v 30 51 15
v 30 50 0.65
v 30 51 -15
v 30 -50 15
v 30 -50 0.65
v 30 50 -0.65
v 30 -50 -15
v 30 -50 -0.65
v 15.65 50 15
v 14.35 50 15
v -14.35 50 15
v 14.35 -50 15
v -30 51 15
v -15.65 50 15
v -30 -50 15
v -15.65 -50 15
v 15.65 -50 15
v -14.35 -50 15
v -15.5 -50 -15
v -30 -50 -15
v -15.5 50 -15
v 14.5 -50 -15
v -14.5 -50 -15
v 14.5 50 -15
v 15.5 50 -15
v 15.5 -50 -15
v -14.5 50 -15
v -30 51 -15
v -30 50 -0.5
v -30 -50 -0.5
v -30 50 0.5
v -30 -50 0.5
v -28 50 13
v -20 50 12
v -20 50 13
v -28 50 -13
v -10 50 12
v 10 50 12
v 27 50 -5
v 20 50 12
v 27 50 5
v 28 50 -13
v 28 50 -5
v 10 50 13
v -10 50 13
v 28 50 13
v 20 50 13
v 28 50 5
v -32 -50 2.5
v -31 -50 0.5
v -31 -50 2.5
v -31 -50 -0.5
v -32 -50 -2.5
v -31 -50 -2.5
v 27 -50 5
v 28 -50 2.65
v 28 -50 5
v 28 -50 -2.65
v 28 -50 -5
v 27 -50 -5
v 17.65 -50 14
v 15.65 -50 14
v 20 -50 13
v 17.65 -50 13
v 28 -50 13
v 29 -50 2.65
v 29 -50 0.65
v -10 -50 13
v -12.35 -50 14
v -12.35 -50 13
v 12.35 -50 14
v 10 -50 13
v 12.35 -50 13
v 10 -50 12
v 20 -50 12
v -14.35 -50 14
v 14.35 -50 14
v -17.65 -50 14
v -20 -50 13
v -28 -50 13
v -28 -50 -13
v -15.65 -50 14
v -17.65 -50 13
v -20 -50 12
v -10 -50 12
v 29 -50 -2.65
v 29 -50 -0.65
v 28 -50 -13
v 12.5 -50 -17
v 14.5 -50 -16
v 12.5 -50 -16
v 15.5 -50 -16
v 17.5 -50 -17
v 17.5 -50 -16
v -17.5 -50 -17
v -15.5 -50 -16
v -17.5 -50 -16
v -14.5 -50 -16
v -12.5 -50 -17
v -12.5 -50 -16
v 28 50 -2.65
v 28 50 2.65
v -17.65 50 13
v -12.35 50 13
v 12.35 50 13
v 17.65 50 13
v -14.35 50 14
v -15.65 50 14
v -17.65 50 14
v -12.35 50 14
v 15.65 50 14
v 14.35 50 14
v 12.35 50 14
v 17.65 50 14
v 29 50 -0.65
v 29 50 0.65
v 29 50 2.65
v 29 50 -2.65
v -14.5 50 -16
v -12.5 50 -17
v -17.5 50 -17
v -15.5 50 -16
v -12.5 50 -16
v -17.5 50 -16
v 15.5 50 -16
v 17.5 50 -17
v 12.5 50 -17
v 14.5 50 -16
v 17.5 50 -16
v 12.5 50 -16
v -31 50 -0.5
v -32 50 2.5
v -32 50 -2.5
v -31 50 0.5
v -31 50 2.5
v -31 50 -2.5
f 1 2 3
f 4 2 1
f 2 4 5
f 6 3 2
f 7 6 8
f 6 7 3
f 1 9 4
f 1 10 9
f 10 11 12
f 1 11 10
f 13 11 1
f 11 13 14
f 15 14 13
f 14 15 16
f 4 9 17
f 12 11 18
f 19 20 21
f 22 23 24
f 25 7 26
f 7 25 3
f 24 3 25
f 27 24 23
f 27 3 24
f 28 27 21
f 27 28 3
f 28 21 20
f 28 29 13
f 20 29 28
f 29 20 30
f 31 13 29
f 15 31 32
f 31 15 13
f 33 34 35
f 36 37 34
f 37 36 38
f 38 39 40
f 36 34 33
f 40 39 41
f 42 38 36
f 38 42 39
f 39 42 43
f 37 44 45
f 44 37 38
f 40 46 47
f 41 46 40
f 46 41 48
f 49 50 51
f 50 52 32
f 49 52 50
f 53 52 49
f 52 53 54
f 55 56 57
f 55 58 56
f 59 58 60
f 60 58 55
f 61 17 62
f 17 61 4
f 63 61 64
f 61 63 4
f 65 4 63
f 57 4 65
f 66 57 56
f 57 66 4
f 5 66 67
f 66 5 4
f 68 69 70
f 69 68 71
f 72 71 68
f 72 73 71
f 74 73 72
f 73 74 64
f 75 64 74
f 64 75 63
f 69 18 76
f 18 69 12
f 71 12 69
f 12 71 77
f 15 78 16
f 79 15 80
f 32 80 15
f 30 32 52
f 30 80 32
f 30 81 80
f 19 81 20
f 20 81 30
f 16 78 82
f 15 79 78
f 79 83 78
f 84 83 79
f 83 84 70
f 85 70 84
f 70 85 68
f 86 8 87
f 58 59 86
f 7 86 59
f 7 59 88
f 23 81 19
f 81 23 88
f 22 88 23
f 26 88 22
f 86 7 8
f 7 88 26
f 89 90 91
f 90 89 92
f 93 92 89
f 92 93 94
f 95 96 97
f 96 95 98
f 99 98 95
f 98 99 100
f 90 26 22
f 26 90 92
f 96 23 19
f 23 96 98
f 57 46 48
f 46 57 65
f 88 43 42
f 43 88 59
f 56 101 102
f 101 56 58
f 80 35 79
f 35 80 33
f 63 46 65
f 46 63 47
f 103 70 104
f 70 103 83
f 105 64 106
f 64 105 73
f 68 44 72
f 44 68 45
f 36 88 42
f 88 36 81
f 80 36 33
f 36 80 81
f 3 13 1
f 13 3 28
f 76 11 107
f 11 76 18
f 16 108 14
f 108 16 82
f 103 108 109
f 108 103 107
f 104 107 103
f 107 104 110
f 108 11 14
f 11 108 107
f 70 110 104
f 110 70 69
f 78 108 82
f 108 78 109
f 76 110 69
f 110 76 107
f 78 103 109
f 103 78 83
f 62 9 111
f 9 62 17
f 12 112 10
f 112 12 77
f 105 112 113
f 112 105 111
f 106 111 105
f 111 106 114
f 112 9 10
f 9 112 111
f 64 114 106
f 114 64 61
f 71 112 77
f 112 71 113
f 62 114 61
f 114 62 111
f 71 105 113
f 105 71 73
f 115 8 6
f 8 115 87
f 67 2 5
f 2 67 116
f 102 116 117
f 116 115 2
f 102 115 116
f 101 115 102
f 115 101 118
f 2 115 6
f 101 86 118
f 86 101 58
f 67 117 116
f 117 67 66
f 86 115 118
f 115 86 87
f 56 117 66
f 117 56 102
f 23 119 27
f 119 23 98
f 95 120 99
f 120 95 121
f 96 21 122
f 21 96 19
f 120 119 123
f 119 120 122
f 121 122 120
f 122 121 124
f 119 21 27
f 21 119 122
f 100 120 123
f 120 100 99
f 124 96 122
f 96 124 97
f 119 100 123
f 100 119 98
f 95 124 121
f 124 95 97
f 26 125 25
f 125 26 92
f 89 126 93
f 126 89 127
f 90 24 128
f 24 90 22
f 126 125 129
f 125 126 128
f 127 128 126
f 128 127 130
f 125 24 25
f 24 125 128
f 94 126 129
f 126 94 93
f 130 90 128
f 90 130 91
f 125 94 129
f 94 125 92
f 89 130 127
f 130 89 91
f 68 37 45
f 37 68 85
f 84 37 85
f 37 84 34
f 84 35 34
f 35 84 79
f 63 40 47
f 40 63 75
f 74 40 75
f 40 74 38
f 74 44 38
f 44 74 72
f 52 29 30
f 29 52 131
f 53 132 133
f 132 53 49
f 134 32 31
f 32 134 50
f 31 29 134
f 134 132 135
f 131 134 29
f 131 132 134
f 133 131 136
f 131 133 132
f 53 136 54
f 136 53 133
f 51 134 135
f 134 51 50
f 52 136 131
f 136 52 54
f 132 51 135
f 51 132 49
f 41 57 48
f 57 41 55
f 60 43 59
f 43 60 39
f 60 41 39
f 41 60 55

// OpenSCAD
/////////
//setup//
/////////

// use this to change the space between the holders for x axis
xSpace = 30;

// the number of holders in the x dimention
xHolders = 2;

// use this to change the space between the holders for z axis
zSpace = 30;

// the number of holders in the z dimention
zHolders = 1;

// the tolerance for holding mounts
holderTolerance = .3;

// the lenth of drawers
lenth = 100;

// for tolerance of printer for wall
wallTolerance = 1;

// the thickness of case wall
caseWallThickness = 2;

// if you want the holders to be auto generated
autoGeneratedHolder = 1;

// with of holder
hWith = 5;

//with of side holders
sHWith = 5;

// the thickness of the backplate
bPThickness = 1;

// the thickness for the Top Holder Plate
TopHolderPlateThickness = 1;

// the overlap of Top Holder Plate
TopHolderPlateOverlap = 5;

// the thickness for the right Holder Plate
rightHolderPlateThickness = 1;

// the overlap of right Holder Plate
rightHolderPlateOverlap = 5;




/////////////
//maincode://
/////////////

xlenthDeterminer = xSpace*xHolders;
zlenthDeterminer = zSpace*zHolders;

/////////
//shell//
/////////

module shell(){

    cube1 = [ 
    
        xlenthDeterminer,
        lenth,
        zlenthDeterminer
    
    ];

    cube2 = [
    
        xlenthDeterminer - caseWallThickness * 2 ,
        lenth,
        zlenthDeterminer - caseWallThickness * 2
    
    ];

    difference(){

        cube(cube1 , center = true);
        cube(cube2 , center = true);
        
    }
    
    translate([ 0 , (lenth / 2) + (bPThickness / 2)  , 0]){
    
        cube([xlenthDeterminer , bPThickness , zlenthDeterminer] , center = true);

    }
}


//////////
//holder//
////////// 

    hThickness = caseWallThickness / 2 ;

module holder(holderTolerance1 , with){
    
    holderPart1 = [
    
        hThickness + holderTolerance1,
        lenth,
        caseWallThickness
    
    ];
    
    holderPart2 = [
    
        with + holderTolerance1 ,
        lenth,
        hThickness
    
    ];
    
    
       
        cube(holderPart1, center = true);    

        translate([ 0 , 0 , -1 * (hThickness / 2) ]){
                
            cube(holderPart2, center = true);
             
        }
    }
    
    module rotatedHolder(holderTolerance2 , with2){
        
        rotate(a = [0,90,0]){
            
            holder(holderTolerance2 , with2);
            
            }
        
        }
    
    module holderTop1PT( x ){
    
        topHolderOffset = (zlenthDeterminer / 2) - (caseWallThickness / 2);
        
        translate([ x , 0 , topHolderOffset ]){
            
            holder(holderTolerance , hWith);
            
        }   
    }
    
    module holderBottom1PT( x ){
    
        bottomHolderOffset = -(((zlenthDeterminer / 2) + caseWallThickness) - (caseWallThickness / 2));
        
        translate([ x , 0 , bottomHolderOffset ]){
            
            holder( 0 , hWith);
            
        }   
    }
    
    module holderRight1PT(z){
        
        rightHolderOffset =  (xlenthDeterminer / 2) - (caseWallThickness / 2);
        
        translate([ rightHolderOffset , 0 , z ]){
            
            rotatedHolder( holderTolerance , sHWith);
            
        }   
    }
        
    module holderLeft1PT(z){
        
        leftHolderOffset =  -((xlenthDeterminer / 2) + (caseWallThickness/2));
        
        translate([ leftHolderOffset , 0 , z ]){
            
            rotatedHolder( 0 , sHWith);
            
        }
    }   
    
    module topHolderPlate(x){
        
        topHolderOffset = (zlenthDeterminer / 2) - (caseWallThickness +  TopHolderPlateThickness / 2);
        
        topPlateDimentions = [
        
        hWith + TopHolderPlateOverlap, 
        lenth, 
        TopHolderPlateThickness
        
        ];
        
        translate([ x , 0 , topHolderOffset ]){
            
            cube(topPlateDimentions, center = true);
            
        }   
    }
        
     module rightHolderPlate(z){
        
        rightHolderOffset = (xlenthDeterminer / 2) - (caseWallThickness +  rightHolderPlateThickness / 2);
         
        rightPlateDimentions = [
            
            rightHolderPlateThickness,
            lenth,
            sHWith + rightHolderPlateOverlap
            
            ];
         
        translate([ rightHolderOffset , 0 , z ]){
            
            
            
            cube(rightPlateDimentions, center = true);
            
        }   
    }
        
    module topHolderPlateMain(){
        
        for(i = [0 : 1 : xHolders - 1 ]){
            
            xHolderOffset = -(xlenthDeterminer / 2) + (i * xSpace) + (xSpace / 2); 
            topHolderPlate(xHolderOffset);
            
        }
        
    }
        
    module rightHolderPlateMain(){
        
        for(i = [0 : 1 : zHolders - 1 ]){
            
            zHolderOffset = -(zlenthDeterminer / 2) + (i * zSpace) + (zSpace / 2); 
            rightHolderPlate(zHolderOffset);
            
        }
        
    }

    module holderTopMain(){

        for(i = [0 : 1 : xHolders - 1 ]){
            
            xHolderOffset = -(xlenthDeterminer / 2) + (i * xSpace) + (xSpace / 2); 
            holderTop1PT(xHolderOffset);

            
        }
    }
    
    module holderBottomMain(){

        for(i = [0 : 1 : xHolders - 1 ]){
            
            xHolderOffset = -(xlenthDeterminer / 2) + (i * xSpace) + (xSpace / 2); 
            holderBottom1PT(xHolderOffset);
            
        }
    }
    
    module holderRightMain(){
        
        for(i = [0 : 1 : zHolders - 1 ]){
            
            zHolderOffset = -(zlenthDeterminer / 2) + (i * zSpace) + (zSpace / 2); 
            holderRight1PT(zHolderOffset);
        
        }
    }
    
    module holderLeftMain(){
        
        for(i = [0 : 1 : zHolders - 1 ]){
            
            zHolderOffset = -(zlenthDeterminer / 2) + (i * zSpace) + (zSpace / 2); 
            holderLeft1PT(zHolderOffset);
        
        }
    }
   
    module holderTopAndRight(){
        
            holderTopMain();
            holderRightMain();
        
        }
    
    module mainCase(){
    
        difference(){
            
            shell();
            holderTopAndRight();
                
            }
        
            

        holderBottomMain(); 
        topHolderPlateMain();
        holderLeftMain();
        rightHolderPlateMain();
    
    }
    
    mainCase();
    
  
